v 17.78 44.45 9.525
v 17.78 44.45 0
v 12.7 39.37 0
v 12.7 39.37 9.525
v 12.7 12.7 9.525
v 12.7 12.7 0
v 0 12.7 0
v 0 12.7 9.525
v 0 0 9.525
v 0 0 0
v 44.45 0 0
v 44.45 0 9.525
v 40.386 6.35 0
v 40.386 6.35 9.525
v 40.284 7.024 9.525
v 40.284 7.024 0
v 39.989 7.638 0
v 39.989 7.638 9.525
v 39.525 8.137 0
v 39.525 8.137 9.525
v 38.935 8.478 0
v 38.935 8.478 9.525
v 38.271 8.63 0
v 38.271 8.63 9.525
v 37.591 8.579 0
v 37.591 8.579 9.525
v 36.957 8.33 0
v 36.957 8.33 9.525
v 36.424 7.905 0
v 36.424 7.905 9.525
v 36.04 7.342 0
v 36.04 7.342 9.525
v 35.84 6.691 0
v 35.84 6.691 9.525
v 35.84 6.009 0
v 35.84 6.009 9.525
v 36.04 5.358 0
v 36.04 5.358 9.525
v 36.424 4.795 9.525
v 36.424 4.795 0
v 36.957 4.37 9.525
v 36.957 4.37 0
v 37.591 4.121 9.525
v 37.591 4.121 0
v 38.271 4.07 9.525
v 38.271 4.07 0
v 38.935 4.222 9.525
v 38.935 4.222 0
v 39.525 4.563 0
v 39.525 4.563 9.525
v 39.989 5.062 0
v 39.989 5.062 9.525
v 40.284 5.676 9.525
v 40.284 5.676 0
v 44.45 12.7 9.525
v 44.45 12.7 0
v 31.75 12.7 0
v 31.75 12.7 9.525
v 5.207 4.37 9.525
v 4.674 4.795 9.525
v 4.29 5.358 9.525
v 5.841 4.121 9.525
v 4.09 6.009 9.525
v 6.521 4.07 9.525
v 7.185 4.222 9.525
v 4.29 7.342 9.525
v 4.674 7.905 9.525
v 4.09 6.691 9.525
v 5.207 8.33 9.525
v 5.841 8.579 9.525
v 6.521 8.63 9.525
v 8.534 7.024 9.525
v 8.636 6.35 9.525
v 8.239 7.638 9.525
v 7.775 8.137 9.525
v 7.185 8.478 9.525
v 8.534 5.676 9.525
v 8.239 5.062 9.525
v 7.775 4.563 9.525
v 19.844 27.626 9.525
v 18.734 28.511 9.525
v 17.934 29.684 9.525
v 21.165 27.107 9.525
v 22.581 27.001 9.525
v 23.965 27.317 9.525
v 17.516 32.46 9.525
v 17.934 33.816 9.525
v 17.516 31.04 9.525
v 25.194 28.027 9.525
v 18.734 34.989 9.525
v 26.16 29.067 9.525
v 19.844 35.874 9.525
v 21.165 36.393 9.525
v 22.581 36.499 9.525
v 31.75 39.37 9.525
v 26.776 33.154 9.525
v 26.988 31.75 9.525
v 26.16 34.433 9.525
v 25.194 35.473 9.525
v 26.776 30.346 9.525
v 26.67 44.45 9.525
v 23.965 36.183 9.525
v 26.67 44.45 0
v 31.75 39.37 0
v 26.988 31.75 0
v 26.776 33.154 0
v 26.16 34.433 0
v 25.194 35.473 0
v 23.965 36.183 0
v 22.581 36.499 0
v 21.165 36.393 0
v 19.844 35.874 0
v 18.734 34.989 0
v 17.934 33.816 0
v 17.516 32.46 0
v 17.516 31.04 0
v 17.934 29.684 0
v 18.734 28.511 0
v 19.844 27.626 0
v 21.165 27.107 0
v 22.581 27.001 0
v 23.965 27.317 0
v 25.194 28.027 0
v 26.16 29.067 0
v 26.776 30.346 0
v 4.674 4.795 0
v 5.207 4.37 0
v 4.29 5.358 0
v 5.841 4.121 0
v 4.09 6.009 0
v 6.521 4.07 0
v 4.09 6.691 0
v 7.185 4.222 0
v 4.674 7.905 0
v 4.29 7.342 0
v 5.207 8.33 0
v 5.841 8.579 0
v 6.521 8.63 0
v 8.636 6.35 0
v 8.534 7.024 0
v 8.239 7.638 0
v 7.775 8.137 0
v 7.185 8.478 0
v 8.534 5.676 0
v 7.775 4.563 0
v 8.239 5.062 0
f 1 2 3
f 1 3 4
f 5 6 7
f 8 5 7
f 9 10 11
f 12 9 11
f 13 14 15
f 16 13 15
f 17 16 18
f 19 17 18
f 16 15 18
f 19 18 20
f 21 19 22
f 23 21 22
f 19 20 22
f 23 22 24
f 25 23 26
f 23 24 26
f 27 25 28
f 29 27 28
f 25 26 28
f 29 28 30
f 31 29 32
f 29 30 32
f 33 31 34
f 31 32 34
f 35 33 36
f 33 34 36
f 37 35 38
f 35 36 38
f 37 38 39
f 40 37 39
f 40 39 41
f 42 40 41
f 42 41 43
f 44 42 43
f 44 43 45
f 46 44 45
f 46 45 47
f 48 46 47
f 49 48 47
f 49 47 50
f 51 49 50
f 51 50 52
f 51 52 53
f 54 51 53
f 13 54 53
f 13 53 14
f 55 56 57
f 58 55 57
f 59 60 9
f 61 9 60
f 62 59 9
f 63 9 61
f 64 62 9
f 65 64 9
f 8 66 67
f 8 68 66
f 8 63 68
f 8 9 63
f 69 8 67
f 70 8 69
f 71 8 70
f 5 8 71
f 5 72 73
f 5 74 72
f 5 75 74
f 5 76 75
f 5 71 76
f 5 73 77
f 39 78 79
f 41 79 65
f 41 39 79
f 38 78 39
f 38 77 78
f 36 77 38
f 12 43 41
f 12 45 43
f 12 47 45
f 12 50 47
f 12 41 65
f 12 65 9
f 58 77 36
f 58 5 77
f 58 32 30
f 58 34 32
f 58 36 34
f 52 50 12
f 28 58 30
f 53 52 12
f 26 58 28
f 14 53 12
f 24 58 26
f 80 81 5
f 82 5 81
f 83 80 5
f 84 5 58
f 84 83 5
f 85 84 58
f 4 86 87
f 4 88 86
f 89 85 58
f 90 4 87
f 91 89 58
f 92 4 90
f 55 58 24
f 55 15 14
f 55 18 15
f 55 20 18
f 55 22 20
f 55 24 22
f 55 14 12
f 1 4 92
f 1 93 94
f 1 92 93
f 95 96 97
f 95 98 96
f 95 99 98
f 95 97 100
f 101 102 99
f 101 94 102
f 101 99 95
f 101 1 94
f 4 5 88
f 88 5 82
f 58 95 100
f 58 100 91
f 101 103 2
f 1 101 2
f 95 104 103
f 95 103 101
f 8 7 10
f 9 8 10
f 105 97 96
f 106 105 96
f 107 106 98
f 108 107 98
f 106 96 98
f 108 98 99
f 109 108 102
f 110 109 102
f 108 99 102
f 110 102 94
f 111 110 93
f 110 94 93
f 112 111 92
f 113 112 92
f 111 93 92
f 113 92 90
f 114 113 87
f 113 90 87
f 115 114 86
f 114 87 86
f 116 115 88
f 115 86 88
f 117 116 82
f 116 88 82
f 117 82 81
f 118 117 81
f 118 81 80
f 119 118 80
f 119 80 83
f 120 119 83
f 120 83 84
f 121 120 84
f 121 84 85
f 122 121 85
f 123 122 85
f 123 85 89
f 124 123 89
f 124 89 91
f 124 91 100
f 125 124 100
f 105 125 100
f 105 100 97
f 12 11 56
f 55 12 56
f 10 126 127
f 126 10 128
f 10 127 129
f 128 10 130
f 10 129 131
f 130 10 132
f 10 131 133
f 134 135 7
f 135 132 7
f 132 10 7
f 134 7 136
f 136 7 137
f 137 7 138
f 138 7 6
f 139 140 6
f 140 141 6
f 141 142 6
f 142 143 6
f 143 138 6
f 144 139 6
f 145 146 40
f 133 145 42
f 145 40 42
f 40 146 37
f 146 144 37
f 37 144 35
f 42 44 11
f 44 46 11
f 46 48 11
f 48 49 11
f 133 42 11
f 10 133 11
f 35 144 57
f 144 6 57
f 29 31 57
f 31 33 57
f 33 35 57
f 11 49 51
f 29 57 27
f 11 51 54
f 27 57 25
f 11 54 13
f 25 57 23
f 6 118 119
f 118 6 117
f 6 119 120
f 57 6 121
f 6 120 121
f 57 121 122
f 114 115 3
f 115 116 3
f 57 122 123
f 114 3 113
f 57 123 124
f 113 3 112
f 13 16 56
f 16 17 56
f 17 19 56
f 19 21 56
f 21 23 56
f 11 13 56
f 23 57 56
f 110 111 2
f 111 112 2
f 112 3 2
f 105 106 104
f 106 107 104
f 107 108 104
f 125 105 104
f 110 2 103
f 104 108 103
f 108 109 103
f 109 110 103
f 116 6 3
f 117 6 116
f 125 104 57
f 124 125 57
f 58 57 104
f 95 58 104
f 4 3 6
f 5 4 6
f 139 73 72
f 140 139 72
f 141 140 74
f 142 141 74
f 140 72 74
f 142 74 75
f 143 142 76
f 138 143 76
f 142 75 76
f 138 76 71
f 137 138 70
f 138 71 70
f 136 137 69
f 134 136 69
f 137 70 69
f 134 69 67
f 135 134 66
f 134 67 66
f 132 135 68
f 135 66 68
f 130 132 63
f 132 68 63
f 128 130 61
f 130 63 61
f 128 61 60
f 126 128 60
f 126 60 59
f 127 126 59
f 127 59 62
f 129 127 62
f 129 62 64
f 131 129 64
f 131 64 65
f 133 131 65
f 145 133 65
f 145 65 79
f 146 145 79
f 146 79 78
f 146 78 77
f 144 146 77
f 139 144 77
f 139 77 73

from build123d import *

# Parameters (mm, degrees)
F1_DEPTH = 9.525
F2_R     = 4.7625
F2_R_2   = 2.286
F3_DEPTH = 25.4
F4_SIZE  = 5.08


with BuildPart() as f1:
    # F0 (on Top) → F1 (new body)
    with BuildSketch(Plane.XY):
        Polygon((0, 12.7), (0, 0), (44.45, 0), (44.45, 12.7), (31.75, 12.7), (31.75, 44.45), (12.7, 44.45), (12.7, 12.7), align=None)
    extrude(amount=F1_DEPTH)

    # F2 (on face) → F3 (cut)
    with BuildSketch(Plane.XY.offset(9.525)):
        with Locations((22.225, 31.75)):
            Circle(F2_R)
        with Locations((6.35, 6.35)):
            Circle(F2_R_2)
        with Locations((38.1, 6.35)):
            Circle(F2_R_2)
    extrude(amount=-F3_DEPTH, mode=Mode.SUBTRACT)

    # F4
    f4_edges = [f1.edges().sort_by_distance(p)[0] for p in [
        (12.7, 44.45, 4.7625),
        (31.75, 44.45, 4.7625),
    ]]
    chamfer(f4_edges, length=F4_SIZE)


solid = f1.part
